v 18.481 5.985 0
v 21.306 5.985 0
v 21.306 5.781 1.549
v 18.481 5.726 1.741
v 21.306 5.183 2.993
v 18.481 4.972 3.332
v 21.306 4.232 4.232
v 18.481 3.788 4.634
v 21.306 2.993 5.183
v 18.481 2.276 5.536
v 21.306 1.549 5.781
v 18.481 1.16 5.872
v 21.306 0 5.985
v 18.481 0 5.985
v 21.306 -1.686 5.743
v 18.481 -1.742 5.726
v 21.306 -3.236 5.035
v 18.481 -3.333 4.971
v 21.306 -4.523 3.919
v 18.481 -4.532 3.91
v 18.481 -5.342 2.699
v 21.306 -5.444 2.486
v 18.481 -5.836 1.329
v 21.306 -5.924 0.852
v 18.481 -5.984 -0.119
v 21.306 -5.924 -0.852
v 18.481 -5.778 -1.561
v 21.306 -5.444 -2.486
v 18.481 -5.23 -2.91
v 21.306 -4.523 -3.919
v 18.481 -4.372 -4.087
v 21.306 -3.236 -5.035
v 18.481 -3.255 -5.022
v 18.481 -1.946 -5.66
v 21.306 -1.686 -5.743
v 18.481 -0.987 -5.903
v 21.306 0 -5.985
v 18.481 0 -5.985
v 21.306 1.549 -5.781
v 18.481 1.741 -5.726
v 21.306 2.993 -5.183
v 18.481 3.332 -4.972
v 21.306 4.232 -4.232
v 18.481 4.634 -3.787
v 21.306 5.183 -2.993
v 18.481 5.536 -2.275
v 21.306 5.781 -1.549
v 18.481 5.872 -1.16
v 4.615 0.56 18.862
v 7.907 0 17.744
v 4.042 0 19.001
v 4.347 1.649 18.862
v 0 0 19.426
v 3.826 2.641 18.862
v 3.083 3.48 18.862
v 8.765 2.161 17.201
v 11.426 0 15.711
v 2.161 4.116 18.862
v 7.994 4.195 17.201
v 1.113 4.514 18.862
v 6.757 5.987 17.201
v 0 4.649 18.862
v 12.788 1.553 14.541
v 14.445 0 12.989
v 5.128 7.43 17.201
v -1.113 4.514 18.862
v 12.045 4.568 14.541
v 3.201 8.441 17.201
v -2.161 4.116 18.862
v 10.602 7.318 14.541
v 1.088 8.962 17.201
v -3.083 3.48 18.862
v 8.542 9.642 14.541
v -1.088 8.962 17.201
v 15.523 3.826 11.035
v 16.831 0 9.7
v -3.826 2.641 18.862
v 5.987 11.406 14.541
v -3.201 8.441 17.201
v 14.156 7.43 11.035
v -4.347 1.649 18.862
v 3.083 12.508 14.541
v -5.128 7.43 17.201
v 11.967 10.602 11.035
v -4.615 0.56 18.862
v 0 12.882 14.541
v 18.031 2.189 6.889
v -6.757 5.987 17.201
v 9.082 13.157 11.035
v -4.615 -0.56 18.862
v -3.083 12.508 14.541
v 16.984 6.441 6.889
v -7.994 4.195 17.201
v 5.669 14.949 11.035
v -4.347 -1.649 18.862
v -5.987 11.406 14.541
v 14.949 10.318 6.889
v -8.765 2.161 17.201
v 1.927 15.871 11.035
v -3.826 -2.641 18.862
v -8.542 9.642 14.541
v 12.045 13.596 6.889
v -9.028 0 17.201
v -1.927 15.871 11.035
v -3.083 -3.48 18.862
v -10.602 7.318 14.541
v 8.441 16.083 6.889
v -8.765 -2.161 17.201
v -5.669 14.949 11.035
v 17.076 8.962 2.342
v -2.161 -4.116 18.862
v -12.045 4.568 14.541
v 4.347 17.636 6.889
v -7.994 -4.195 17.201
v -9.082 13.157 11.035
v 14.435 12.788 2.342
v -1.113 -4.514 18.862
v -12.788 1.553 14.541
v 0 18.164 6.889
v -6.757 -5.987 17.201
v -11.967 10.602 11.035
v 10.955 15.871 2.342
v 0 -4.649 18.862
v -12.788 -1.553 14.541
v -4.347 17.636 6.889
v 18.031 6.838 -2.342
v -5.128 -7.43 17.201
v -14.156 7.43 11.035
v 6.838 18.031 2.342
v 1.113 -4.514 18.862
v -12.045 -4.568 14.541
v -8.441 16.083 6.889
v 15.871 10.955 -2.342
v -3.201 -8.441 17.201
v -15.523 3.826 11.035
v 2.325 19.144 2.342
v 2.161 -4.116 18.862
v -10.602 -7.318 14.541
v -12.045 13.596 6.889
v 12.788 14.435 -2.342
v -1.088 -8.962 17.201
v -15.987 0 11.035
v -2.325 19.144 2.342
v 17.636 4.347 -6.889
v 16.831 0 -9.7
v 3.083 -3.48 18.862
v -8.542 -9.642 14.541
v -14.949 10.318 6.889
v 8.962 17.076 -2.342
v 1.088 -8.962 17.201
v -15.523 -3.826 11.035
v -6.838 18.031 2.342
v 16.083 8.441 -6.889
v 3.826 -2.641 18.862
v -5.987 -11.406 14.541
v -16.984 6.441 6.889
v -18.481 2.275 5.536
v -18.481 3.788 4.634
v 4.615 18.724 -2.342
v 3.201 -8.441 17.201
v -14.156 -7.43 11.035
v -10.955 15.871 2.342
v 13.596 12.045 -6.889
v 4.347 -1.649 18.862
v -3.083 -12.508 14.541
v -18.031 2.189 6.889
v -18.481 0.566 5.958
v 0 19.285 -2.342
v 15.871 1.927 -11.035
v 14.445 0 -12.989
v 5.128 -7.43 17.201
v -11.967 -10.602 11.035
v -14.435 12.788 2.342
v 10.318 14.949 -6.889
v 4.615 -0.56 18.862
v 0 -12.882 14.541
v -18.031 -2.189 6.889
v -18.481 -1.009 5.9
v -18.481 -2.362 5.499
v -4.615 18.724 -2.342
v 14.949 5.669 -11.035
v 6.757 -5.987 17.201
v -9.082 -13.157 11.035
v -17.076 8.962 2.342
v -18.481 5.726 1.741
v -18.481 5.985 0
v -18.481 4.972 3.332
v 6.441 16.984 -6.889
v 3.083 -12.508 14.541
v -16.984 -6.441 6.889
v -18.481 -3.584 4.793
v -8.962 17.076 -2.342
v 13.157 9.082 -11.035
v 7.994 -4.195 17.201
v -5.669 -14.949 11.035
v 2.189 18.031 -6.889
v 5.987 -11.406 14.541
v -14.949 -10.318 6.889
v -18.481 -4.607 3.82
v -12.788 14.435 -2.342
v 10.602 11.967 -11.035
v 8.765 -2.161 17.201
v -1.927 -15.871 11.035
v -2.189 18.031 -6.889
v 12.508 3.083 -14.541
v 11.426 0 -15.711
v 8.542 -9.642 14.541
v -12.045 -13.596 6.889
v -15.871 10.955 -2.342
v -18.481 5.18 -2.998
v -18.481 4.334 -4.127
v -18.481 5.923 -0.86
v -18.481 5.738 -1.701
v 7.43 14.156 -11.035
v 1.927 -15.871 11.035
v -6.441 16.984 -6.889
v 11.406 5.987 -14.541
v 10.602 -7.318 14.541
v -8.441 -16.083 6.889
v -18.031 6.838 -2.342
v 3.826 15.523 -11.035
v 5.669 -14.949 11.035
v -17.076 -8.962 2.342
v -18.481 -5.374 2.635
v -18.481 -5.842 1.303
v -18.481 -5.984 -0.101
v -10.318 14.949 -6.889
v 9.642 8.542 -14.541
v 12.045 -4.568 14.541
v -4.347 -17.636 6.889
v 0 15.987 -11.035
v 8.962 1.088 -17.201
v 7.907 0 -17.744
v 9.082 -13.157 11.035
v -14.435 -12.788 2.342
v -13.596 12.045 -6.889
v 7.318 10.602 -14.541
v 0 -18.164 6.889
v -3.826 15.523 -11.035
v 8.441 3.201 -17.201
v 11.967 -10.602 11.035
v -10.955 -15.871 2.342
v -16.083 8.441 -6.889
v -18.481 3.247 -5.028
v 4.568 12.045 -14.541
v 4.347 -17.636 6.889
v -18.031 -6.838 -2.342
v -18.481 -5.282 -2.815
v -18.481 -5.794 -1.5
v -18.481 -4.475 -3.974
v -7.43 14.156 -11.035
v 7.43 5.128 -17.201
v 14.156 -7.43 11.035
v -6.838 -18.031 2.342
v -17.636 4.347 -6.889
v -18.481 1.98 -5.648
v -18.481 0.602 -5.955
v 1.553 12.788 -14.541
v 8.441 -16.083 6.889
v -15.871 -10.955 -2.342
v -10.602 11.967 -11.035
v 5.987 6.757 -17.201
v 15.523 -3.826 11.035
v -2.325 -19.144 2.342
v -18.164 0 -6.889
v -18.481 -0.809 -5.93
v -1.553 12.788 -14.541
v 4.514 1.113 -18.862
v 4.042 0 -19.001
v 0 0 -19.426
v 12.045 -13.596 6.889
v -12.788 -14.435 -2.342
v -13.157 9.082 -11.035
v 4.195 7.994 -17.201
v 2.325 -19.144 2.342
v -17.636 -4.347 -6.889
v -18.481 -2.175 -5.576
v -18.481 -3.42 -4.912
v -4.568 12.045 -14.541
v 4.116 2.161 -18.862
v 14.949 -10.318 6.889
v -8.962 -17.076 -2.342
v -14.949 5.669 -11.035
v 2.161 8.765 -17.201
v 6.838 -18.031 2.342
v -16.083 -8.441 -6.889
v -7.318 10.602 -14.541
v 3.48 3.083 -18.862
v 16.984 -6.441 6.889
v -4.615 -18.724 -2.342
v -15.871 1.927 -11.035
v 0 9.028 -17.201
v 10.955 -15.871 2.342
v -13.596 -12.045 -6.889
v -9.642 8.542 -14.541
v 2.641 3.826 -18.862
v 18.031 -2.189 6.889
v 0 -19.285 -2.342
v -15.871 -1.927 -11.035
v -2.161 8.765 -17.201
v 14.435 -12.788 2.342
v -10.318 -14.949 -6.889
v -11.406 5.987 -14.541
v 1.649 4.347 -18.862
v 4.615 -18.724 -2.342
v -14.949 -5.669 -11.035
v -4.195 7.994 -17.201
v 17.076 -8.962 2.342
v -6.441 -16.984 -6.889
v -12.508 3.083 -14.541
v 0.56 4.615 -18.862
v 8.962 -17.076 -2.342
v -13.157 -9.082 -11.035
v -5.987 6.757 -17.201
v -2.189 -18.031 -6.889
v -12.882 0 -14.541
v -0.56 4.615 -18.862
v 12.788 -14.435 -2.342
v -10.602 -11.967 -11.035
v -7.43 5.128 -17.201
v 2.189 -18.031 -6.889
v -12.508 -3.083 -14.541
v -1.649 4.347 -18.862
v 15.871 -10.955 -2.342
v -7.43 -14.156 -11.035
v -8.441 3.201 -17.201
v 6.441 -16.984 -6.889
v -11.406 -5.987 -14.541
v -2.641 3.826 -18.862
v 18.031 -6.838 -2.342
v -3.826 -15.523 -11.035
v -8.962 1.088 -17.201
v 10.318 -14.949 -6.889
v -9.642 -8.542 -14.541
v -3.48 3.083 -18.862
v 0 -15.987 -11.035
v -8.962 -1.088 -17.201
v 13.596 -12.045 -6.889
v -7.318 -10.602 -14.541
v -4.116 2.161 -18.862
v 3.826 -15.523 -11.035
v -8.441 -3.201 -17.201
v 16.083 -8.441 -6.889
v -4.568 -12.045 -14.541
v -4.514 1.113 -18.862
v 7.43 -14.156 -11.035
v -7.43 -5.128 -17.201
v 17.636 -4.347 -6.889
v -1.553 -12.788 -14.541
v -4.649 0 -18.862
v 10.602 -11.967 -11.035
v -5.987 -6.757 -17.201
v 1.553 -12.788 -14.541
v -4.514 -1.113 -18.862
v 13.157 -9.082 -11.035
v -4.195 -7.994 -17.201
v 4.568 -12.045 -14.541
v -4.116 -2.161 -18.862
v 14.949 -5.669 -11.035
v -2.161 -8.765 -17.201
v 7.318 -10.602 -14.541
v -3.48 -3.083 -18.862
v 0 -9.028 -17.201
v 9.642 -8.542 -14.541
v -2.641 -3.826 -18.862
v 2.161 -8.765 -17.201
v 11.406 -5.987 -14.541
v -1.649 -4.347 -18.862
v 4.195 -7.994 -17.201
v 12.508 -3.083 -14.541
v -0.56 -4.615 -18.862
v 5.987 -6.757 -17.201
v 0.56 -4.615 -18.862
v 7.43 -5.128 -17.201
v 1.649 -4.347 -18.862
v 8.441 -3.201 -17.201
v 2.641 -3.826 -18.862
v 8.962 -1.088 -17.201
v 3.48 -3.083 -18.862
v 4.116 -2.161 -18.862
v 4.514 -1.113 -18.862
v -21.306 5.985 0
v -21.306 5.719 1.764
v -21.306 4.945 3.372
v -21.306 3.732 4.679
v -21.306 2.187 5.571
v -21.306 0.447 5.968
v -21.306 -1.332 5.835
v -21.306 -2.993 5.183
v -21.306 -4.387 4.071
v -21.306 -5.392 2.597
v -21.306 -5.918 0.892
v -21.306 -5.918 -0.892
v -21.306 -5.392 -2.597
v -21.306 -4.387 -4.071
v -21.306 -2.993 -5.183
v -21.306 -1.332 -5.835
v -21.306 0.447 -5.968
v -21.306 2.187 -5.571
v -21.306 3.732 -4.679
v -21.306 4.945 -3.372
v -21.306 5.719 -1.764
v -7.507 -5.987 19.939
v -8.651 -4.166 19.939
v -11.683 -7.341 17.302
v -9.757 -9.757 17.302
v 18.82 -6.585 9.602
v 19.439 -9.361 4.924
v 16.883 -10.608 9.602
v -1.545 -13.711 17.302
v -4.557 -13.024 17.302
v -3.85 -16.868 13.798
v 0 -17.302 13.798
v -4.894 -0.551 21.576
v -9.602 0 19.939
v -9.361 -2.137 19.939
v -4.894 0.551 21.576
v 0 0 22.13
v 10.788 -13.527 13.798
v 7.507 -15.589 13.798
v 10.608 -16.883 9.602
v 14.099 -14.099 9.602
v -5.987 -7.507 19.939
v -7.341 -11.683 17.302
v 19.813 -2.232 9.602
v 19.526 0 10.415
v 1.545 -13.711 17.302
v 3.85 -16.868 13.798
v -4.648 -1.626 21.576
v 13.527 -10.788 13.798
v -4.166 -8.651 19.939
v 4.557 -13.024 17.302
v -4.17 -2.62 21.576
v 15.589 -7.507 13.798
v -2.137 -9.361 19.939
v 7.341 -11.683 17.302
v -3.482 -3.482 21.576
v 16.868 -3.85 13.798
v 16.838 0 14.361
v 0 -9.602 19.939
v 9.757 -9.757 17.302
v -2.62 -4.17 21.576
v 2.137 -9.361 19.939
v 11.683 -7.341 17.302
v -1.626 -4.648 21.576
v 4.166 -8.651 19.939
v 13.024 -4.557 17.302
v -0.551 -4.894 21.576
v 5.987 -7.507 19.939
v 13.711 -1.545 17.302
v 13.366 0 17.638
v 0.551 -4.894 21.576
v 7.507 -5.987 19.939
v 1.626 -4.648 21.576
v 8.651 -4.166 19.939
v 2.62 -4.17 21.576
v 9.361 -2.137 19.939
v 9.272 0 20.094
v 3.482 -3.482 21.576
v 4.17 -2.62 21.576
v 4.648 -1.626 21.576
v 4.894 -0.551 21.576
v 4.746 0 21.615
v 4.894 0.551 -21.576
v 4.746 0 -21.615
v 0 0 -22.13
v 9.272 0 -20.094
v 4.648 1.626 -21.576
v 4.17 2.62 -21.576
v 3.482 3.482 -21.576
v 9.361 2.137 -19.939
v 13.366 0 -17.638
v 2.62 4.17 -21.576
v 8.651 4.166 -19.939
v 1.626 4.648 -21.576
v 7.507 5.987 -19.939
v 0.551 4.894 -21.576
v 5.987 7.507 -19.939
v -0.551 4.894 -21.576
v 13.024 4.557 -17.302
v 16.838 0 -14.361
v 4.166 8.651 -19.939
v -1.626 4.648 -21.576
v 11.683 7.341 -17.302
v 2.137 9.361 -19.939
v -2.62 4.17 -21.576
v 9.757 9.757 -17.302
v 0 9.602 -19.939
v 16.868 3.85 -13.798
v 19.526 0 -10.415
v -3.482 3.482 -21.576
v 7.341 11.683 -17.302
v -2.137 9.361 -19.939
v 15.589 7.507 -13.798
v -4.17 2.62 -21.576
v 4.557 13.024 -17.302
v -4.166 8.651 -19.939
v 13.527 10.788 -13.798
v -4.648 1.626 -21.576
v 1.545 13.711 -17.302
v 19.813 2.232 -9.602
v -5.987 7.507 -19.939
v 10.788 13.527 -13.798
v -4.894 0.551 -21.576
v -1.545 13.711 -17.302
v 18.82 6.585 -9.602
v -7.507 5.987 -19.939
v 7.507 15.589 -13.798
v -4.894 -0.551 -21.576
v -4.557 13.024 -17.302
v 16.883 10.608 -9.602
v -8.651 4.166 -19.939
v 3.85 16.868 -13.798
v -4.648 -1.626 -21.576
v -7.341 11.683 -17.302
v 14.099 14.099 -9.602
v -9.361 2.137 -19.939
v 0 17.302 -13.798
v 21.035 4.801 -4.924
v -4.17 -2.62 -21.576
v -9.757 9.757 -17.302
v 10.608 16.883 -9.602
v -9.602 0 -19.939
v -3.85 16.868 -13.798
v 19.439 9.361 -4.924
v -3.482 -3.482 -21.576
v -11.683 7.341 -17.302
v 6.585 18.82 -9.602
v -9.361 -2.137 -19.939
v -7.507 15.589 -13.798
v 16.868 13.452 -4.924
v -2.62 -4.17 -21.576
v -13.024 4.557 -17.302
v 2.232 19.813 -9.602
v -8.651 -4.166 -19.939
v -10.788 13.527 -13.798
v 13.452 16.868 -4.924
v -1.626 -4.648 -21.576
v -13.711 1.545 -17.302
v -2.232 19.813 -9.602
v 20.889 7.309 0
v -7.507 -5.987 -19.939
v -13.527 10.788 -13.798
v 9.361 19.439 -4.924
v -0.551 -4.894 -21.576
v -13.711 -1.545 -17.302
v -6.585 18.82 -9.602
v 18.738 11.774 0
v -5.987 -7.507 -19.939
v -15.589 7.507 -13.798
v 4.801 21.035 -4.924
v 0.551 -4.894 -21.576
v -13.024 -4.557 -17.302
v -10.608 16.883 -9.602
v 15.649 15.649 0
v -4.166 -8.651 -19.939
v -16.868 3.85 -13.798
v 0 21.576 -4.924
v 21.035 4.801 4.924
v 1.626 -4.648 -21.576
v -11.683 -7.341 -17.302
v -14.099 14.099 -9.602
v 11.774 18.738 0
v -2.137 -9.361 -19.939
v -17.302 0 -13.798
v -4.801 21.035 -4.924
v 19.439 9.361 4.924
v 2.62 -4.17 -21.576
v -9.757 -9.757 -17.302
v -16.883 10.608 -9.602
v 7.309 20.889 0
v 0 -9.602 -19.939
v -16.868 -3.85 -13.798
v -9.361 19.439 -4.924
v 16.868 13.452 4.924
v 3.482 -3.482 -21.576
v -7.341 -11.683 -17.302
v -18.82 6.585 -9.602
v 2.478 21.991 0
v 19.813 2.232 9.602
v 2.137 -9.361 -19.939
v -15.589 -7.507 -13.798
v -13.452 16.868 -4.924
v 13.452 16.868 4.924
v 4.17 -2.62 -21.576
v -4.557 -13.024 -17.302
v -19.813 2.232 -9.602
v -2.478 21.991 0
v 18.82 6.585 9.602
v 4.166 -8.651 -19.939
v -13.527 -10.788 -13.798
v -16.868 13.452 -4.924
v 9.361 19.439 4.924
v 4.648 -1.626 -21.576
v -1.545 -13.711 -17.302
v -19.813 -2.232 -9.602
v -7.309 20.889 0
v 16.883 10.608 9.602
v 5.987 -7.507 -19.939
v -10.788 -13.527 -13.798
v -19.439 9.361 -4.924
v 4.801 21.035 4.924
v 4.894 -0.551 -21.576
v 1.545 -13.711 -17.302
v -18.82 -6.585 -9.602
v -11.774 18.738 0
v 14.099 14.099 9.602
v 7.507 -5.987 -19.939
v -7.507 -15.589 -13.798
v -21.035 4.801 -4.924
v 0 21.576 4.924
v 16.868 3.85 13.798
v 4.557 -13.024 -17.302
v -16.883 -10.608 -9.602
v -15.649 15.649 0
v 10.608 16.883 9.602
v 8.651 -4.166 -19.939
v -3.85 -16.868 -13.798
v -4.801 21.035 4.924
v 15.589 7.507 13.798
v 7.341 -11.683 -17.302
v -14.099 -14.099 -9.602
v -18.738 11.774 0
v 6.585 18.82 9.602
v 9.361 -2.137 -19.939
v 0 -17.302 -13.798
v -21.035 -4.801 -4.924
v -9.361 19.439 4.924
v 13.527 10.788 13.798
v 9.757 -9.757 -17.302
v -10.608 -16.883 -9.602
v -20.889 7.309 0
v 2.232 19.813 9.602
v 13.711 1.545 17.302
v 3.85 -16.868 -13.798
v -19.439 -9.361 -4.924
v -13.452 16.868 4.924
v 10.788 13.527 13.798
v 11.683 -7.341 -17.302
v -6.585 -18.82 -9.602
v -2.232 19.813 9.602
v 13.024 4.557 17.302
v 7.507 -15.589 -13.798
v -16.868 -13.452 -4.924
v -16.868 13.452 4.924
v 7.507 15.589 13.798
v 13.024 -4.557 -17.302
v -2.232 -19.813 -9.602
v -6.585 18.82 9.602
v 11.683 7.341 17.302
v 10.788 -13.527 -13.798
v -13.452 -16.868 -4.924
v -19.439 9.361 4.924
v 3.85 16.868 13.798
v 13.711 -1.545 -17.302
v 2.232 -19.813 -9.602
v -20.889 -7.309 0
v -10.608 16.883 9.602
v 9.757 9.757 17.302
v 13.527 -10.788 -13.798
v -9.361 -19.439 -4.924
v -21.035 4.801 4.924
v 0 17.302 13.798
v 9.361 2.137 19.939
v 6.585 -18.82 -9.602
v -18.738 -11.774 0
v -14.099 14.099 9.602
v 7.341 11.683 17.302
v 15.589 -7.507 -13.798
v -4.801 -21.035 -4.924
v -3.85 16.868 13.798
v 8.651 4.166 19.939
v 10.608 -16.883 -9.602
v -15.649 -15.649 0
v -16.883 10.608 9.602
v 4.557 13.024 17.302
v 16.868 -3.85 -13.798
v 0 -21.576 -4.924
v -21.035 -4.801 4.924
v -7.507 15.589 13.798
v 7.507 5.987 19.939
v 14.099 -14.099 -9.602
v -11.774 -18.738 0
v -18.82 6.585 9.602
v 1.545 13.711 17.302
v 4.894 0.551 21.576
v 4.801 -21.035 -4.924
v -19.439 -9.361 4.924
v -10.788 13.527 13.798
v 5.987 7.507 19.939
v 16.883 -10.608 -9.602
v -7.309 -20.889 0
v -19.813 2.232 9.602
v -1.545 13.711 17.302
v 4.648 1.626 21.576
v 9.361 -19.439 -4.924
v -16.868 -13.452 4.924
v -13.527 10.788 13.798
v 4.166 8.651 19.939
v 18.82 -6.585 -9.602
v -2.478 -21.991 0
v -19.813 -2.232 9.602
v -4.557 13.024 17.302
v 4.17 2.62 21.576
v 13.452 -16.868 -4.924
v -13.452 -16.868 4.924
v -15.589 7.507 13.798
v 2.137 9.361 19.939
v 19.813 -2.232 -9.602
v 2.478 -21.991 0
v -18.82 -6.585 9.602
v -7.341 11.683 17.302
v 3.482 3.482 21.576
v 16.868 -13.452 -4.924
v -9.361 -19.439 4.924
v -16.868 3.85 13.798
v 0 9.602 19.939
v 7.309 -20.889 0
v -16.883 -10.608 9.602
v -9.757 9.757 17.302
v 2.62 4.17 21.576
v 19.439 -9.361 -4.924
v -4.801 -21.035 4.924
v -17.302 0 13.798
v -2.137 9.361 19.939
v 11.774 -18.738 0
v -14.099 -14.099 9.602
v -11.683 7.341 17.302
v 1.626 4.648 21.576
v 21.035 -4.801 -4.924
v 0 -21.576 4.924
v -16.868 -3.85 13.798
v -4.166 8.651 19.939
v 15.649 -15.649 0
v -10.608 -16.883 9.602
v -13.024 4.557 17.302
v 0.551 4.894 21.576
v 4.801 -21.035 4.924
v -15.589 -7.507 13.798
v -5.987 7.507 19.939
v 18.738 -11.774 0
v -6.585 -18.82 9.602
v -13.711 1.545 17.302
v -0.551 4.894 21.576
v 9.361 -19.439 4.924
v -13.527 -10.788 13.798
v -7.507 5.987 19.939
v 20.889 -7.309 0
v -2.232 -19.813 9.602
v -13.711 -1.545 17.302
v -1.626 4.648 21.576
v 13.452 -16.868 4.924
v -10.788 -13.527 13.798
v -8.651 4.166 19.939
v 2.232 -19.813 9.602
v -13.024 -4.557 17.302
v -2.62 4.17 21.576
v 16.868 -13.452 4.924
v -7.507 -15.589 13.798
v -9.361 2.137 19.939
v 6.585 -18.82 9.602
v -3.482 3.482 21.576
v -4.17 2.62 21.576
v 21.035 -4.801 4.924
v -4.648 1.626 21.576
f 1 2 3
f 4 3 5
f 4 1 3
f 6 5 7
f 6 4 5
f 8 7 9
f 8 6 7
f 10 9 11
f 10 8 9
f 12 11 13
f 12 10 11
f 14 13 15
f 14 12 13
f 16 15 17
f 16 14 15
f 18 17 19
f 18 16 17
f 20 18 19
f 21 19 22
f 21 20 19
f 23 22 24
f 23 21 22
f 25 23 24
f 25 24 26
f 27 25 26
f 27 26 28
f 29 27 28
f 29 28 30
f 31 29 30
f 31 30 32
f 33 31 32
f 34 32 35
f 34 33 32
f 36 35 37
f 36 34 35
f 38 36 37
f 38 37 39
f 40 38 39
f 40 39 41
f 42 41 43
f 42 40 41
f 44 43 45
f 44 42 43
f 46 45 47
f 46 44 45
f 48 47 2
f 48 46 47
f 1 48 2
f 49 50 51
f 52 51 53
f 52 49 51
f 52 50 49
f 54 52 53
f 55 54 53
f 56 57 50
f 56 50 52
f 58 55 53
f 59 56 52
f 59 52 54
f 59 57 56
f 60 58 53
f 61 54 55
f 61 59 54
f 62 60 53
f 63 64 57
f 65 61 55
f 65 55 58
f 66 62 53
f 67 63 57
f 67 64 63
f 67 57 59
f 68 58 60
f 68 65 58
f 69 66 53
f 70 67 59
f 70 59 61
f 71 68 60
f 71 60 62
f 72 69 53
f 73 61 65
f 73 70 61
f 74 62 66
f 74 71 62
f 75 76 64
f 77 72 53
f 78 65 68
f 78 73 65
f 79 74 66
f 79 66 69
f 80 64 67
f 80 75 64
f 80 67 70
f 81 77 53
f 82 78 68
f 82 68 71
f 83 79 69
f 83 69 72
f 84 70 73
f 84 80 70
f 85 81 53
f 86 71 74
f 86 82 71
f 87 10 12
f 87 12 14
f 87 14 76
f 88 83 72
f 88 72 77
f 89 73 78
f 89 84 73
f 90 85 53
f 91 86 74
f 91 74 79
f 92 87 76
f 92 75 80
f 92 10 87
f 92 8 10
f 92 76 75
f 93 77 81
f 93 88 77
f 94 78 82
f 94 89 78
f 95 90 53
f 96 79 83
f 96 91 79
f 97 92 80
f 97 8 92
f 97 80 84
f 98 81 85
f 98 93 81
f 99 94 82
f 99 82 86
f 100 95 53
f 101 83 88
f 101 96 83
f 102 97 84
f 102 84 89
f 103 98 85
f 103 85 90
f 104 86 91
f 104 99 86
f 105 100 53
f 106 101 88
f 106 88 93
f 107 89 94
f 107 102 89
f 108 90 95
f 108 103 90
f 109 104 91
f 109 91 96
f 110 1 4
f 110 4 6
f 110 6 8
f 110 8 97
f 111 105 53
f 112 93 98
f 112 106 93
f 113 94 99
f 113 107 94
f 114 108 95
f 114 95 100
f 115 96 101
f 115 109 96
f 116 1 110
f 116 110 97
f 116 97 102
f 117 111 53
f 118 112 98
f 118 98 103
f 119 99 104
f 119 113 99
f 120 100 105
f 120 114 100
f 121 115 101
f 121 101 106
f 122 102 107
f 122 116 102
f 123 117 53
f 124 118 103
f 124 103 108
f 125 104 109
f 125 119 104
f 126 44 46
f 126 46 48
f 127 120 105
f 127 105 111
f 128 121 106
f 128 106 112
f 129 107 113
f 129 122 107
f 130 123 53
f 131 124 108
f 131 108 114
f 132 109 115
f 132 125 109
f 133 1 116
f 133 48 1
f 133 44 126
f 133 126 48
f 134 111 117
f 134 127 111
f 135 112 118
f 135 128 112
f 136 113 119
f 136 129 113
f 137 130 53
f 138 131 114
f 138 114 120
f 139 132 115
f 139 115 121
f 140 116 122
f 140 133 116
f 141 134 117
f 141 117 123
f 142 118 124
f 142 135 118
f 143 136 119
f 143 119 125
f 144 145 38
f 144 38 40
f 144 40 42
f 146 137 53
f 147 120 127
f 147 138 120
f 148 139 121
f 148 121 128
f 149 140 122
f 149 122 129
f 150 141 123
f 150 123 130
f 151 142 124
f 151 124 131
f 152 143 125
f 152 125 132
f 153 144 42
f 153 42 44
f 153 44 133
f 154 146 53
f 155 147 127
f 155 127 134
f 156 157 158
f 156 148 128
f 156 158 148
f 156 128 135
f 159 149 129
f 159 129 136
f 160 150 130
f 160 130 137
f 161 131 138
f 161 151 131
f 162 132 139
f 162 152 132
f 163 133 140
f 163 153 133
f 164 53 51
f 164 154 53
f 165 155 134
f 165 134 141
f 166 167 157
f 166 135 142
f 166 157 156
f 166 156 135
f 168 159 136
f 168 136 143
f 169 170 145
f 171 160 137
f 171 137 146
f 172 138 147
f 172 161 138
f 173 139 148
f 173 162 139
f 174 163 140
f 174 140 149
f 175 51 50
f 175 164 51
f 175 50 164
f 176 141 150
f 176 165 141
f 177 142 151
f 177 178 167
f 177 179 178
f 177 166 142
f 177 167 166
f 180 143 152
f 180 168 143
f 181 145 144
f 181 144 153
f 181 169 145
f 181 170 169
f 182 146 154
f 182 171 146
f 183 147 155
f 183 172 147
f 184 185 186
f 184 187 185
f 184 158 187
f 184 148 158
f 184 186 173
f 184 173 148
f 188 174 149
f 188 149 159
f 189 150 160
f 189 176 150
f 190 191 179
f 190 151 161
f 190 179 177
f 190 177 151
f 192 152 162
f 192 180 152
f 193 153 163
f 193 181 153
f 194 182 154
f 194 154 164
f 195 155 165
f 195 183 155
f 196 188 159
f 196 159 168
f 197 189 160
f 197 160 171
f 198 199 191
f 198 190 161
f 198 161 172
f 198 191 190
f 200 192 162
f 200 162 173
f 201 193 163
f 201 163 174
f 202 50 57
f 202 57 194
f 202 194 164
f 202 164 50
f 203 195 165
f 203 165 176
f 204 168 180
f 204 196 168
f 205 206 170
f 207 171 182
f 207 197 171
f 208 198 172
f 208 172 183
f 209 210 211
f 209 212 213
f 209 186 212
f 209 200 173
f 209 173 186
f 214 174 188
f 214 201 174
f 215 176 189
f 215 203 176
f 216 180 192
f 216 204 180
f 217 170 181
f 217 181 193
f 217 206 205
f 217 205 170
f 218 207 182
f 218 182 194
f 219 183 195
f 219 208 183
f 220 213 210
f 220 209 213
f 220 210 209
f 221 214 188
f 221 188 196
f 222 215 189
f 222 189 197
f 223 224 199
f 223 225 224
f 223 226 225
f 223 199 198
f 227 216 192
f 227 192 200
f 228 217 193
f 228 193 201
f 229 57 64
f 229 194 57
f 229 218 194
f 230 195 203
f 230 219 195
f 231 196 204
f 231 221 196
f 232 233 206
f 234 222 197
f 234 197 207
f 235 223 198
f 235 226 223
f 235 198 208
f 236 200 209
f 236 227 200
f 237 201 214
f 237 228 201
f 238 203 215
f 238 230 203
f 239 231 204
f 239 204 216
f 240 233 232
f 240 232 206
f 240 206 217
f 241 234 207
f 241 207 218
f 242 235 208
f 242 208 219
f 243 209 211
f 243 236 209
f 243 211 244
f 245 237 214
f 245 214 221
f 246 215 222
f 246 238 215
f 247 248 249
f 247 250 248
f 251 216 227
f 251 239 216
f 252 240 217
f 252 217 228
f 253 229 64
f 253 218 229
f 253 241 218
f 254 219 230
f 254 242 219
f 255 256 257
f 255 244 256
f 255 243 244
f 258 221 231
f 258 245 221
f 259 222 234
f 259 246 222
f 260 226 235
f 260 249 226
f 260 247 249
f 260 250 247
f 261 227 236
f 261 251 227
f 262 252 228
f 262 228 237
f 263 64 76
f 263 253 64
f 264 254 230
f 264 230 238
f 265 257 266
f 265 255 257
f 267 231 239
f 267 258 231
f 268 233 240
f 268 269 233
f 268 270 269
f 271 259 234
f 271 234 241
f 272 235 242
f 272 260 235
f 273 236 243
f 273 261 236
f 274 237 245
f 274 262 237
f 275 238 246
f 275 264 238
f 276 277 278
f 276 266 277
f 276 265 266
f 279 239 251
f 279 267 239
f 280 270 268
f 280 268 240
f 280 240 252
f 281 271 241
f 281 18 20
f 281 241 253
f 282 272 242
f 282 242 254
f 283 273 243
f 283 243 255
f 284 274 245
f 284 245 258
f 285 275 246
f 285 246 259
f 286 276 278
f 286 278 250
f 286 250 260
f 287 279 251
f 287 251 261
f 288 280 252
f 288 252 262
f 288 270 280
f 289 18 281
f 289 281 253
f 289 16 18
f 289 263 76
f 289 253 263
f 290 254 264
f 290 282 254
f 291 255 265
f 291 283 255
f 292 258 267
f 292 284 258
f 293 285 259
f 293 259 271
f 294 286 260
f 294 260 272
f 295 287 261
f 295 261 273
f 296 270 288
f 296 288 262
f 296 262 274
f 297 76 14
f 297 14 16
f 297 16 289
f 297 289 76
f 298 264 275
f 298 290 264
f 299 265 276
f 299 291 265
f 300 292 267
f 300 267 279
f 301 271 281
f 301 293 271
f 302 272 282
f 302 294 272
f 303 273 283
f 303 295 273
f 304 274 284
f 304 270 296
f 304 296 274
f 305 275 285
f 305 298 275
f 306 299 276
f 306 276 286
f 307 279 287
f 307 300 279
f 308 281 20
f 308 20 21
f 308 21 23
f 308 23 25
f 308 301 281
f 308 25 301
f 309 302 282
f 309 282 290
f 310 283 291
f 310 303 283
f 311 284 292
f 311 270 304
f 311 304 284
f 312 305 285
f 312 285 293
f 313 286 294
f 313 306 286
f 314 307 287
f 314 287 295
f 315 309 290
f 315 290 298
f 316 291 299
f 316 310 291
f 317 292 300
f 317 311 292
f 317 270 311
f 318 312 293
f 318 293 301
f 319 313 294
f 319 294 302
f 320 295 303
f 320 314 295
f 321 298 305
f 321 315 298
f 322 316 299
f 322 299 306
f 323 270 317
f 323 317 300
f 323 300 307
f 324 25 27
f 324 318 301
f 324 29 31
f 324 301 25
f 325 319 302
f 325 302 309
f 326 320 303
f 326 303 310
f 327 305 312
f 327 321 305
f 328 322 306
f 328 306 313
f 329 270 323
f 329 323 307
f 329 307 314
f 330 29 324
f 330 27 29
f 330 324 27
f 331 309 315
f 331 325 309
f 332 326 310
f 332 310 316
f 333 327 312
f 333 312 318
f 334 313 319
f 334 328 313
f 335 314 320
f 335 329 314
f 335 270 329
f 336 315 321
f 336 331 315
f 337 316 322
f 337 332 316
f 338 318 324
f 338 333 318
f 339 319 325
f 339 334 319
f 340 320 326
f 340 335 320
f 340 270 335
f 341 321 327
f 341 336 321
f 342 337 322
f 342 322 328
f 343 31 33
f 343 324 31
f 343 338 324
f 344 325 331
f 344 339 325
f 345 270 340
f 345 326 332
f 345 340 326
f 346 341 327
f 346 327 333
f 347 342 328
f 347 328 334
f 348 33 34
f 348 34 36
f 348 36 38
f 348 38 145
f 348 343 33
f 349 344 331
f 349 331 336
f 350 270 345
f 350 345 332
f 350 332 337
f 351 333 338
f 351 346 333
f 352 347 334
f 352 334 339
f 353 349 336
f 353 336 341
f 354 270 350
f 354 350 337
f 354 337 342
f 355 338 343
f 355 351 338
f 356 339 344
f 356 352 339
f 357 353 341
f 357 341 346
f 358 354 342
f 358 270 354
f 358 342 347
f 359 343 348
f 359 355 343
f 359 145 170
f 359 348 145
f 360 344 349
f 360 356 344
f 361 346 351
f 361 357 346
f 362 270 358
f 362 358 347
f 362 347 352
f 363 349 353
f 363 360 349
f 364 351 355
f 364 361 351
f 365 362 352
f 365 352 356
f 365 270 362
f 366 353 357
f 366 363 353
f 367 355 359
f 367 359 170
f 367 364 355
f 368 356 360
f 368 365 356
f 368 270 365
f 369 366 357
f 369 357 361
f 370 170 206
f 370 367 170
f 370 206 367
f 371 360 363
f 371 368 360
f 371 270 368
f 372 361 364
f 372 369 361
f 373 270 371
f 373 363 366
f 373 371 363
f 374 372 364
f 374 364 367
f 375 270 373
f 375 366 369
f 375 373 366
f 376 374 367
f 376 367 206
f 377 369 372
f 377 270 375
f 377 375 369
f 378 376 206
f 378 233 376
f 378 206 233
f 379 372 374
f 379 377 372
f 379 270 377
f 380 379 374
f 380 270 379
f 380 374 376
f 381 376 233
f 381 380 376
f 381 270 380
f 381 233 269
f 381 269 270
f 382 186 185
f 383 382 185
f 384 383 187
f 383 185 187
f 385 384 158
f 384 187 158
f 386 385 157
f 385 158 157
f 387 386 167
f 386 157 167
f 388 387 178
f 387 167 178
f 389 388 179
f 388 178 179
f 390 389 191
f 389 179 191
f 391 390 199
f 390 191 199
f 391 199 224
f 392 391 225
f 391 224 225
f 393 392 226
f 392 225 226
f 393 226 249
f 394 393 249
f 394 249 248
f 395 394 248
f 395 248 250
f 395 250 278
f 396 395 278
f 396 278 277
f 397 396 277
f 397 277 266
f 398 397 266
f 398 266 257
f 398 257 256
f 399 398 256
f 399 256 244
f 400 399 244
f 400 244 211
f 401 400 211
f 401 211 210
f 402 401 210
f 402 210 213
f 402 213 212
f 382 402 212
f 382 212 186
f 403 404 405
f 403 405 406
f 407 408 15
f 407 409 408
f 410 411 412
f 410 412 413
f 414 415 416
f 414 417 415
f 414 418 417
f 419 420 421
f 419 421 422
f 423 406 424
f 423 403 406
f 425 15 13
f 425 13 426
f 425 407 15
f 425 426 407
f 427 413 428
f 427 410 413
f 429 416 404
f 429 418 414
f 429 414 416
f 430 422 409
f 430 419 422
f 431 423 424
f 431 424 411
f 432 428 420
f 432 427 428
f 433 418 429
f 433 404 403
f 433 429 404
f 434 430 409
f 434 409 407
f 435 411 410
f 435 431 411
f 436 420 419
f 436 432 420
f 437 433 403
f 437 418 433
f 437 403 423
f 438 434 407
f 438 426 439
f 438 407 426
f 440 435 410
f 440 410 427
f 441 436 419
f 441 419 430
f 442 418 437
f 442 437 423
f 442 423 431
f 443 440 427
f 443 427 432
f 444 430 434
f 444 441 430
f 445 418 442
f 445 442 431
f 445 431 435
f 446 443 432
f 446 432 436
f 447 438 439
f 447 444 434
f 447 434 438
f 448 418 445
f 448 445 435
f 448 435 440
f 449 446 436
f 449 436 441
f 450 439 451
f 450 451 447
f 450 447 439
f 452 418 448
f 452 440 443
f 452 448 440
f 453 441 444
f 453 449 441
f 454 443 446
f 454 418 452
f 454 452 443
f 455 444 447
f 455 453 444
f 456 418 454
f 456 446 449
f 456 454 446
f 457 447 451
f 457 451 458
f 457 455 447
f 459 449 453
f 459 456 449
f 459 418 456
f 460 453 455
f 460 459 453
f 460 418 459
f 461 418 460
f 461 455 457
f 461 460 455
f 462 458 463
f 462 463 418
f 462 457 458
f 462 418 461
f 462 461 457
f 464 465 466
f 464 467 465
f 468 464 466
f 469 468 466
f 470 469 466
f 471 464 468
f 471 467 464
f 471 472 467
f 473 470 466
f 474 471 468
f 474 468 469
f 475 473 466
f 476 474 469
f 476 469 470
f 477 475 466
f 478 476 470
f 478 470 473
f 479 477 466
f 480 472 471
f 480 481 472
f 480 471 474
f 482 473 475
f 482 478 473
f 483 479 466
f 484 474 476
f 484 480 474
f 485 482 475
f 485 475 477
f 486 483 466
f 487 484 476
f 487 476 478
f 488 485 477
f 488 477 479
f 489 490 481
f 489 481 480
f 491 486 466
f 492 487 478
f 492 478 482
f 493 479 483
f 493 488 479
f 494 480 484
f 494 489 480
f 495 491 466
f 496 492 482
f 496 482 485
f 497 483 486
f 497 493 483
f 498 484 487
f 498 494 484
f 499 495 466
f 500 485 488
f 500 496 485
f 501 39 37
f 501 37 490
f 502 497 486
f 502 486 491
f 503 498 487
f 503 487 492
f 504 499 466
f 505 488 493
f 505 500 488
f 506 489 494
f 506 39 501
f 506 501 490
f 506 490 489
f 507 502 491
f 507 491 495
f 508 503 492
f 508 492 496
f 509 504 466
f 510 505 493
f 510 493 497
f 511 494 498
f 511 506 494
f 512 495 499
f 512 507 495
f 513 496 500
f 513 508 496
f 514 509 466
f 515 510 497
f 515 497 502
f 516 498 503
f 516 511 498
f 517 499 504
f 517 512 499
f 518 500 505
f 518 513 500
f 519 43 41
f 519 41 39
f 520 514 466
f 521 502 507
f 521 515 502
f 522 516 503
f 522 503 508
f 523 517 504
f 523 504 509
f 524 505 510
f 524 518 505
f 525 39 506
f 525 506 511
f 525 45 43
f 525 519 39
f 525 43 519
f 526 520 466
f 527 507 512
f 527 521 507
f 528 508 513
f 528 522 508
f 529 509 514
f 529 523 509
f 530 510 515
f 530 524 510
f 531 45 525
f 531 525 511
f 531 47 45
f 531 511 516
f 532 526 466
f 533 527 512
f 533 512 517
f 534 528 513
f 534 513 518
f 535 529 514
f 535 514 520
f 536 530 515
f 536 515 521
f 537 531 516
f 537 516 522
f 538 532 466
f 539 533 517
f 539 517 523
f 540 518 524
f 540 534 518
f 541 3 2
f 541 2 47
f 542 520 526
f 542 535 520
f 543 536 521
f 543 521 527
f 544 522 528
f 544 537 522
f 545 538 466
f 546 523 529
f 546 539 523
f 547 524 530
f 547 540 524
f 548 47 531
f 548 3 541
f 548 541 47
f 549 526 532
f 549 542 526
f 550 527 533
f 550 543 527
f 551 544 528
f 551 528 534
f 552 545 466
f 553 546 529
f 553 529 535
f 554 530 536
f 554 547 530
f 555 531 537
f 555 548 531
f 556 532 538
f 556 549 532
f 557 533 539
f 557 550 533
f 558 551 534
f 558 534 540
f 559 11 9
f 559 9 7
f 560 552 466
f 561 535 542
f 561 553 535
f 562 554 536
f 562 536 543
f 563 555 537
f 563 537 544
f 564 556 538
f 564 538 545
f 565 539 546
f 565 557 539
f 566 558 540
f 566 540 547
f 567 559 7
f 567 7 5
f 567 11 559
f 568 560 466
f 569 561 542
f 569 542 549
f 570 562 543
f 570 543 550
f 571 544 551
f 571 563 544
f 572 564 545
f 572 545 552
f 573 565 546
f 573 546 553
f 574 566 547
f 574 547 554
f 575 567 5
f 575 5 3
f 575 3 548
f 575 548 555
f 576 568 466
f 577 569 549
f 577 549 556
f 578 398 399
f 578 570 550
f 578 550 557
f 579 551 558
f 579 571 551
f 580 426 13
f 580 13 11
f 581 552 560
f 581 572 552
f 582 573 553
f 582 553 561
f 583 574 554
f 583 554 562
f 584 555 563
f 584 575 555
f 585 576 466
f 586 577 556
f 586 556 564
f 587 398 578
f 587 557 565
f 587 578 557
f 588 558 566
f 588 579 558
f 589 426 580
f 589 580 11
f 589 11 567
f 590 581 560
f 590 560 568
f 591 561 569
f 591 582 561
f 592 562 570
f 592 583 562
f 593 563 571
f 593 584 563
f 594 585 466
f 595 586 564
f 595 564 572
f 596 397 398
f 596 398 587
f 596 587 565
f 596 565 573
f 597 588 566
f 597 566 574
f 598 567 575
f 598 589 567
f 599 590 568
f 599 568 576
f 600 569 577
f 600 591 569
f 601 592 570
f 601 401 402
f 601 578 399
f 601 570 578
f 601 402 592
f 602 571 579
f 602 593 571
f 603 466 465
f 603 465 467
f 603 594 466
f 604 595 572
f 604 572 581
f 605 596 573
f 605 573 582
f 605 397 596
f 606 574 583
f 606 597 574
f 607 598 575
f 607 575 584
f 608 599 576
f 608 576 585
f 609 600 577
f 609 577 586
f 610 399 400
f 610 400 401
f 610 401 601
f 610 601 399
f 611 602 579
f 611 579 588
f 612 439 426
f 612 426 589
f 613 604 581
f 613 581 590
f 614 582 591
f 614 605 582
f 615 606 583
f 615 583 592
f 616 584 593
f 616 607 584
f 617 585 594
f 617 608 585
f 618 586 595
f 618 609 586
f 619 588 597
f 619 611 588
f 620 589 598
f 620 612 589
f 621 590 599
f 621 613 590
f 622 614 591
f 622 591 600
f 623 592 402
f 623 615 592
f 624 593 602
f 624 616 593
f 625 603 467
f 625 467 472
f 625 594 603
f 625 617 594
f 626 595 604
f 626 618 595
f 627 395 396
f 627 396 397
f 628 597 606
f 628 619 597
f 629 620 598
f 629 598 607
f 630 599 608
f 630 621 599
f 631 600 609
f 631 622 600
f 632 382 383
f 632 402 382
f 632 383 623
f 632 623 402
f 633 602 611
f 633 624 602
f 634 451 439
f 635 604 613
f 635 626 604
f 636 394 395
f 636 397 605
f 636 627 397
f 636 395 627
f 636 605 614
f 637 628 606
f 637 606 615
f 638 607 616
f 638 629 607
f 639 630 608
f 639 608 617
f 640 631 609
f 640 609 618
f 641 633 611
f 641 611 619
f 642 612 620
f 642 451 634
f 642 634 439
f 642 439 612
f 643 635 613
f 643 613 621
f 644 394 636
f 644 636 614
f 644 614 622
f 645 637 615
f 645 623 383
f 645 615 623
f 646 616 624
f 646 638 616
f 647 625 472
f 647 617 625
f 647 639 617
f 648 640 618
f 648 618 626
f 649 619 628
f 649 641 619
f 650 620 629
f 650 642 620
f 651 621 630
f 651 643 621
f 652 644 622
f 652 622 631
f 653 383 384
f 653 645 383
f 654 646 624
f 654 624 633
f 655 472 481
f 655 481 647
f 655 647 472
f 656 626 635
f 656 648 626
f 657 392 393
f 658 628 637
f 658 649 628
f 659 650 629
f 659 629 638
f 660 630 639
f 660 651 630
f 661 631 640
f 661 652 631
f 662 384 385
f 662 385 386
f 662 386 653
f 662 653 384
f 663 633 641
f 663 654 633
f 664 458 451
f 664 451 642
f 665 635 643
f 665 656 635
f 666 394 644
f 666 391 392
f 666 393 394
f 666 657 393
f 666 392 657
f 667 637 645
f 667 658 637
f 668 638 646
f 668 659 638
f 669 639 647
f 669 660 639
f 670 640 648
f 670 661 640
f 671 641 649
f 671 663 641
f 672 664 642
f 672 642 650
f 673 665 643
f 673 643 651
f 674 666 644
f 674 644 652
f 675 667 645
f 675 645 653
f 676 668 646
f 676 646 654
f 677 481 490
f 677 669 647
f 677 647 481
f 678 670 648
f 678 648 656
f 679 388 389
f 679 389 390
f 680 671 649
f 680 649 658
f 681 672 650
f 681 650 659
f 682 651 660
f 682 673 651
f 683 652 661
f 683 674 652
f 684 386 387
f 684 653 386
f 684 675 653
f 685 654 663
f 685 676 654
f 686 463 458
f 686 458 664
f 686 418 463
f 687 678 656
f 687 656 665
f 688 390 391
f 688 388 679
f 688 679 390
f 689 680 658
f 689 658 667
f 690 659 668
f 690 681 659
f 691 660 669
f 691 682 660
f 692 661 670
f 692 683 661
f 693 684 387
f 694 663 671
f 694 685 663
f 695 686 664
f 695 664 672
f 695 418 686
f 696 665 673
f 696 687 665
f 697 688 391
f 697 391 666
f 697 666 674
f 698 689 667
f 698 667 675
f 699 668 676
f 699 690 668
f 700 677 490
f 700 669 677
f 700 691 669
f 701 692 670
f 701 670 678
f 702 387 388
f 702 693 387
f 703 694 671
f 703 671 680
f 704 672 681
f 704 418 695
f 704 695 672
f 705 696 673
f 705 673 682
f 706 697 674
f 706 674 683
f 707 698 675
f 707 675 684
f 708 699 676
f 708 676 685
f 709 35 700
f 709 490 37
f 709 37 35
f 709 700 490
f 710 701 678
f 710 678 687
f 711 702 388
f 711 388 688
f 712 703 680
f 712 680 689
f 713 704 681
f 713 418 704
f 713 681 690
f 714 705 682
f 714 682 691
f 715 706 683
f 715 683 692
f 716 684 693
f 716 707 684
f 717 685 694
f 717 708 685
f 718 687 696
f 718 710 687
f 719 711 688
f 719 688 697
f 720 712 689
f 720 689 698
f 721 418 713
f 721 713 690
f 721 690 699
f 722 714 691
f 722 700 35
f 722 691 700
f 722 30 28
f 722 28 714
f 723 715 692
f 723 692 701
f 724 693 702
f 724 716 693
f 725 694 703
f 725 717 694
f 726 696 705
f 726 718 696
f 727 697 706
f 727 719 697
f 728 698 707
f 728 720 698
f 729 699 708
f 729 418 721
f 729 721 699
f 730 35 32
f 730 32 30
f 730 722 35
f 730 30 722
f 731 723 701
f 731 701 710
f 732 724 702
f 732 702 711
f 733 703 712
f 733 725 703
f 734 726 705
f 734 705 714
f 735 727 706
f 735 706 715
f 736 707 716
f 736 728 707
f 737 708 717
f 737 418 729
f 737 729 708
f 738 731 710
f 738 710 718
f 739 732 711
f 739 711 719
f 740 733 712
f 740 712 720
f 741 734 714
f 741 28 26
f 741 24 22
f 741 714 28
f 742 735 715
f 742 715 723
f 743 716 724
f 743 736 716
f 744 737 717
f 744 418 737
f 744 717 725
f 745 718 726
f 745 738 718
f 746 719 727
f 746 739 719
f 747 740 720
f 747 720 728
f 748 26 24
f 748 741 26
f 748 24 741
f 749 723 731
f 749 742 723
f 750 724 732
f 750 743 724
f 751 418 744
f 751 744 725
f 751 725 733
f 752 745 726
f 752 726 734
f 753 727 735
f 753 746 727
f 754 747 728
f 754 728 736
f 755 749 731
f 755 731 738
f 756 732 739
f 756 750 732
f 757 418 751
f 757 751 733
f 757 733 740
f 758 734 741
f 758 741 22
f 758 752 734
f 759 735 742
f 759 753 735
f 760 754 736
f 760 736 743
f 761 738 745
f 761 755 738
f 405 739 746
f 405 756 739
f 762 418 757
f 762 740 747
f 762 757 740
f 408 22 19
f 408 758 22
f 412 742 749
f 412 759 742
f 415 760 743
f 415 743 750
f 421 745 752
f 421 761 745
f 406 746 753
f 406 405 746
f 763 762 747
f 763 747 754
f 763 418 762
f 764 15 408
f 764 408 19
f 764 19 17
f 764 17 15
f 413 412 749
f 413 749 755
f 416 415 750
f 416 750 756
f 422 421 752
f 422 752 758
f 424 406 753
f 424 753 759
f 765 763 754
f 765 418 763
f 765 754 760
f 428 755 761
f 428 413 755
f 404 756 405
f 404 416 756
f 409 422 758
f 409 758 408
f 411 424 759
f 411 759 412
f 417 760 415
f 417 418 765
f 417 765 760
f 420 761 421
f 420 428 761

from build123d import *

# Parameters (mm, degrees)
F2_R     = 5.985152
F3_DEPTH = 25.4
F4_DEPTH = 25.4


with BuildPart() as f1:
    # F0 (on Front) → F1 (revolve)
    with BuildSketch(Plane.XZ):
        with BuildLine():
            Line((0, 22.130426), (0, 19.426251))
            ThreePointArc((0, 19.426251), (19.426251, 0), (0, -19.426251))
            Line((0, -19.426251), (0, -22.130426))
            ThreePointArc((0, -22.130426), (22.130426, 0), (0, 22.130426))
        make_face()
    revolve(axis=Axis((0, 0, 11.065213), (0, 0, 1)))

    # F2 (on Right) → F3 (cut)
    with BuildSketch(Plane.YZ):
        Circle(F2_R)
    extrude(amount=-F3_DEPTH, mode=Mode.SUBTRACT)

    # F2 (on Right) → F4 (cut)
    with BuildSketch(Plane.YZ):
        Circle(F2_R)
    extrude(amount=F4_DEPTH, mode=Mode.SUBTRACT)


solid = f1.part
